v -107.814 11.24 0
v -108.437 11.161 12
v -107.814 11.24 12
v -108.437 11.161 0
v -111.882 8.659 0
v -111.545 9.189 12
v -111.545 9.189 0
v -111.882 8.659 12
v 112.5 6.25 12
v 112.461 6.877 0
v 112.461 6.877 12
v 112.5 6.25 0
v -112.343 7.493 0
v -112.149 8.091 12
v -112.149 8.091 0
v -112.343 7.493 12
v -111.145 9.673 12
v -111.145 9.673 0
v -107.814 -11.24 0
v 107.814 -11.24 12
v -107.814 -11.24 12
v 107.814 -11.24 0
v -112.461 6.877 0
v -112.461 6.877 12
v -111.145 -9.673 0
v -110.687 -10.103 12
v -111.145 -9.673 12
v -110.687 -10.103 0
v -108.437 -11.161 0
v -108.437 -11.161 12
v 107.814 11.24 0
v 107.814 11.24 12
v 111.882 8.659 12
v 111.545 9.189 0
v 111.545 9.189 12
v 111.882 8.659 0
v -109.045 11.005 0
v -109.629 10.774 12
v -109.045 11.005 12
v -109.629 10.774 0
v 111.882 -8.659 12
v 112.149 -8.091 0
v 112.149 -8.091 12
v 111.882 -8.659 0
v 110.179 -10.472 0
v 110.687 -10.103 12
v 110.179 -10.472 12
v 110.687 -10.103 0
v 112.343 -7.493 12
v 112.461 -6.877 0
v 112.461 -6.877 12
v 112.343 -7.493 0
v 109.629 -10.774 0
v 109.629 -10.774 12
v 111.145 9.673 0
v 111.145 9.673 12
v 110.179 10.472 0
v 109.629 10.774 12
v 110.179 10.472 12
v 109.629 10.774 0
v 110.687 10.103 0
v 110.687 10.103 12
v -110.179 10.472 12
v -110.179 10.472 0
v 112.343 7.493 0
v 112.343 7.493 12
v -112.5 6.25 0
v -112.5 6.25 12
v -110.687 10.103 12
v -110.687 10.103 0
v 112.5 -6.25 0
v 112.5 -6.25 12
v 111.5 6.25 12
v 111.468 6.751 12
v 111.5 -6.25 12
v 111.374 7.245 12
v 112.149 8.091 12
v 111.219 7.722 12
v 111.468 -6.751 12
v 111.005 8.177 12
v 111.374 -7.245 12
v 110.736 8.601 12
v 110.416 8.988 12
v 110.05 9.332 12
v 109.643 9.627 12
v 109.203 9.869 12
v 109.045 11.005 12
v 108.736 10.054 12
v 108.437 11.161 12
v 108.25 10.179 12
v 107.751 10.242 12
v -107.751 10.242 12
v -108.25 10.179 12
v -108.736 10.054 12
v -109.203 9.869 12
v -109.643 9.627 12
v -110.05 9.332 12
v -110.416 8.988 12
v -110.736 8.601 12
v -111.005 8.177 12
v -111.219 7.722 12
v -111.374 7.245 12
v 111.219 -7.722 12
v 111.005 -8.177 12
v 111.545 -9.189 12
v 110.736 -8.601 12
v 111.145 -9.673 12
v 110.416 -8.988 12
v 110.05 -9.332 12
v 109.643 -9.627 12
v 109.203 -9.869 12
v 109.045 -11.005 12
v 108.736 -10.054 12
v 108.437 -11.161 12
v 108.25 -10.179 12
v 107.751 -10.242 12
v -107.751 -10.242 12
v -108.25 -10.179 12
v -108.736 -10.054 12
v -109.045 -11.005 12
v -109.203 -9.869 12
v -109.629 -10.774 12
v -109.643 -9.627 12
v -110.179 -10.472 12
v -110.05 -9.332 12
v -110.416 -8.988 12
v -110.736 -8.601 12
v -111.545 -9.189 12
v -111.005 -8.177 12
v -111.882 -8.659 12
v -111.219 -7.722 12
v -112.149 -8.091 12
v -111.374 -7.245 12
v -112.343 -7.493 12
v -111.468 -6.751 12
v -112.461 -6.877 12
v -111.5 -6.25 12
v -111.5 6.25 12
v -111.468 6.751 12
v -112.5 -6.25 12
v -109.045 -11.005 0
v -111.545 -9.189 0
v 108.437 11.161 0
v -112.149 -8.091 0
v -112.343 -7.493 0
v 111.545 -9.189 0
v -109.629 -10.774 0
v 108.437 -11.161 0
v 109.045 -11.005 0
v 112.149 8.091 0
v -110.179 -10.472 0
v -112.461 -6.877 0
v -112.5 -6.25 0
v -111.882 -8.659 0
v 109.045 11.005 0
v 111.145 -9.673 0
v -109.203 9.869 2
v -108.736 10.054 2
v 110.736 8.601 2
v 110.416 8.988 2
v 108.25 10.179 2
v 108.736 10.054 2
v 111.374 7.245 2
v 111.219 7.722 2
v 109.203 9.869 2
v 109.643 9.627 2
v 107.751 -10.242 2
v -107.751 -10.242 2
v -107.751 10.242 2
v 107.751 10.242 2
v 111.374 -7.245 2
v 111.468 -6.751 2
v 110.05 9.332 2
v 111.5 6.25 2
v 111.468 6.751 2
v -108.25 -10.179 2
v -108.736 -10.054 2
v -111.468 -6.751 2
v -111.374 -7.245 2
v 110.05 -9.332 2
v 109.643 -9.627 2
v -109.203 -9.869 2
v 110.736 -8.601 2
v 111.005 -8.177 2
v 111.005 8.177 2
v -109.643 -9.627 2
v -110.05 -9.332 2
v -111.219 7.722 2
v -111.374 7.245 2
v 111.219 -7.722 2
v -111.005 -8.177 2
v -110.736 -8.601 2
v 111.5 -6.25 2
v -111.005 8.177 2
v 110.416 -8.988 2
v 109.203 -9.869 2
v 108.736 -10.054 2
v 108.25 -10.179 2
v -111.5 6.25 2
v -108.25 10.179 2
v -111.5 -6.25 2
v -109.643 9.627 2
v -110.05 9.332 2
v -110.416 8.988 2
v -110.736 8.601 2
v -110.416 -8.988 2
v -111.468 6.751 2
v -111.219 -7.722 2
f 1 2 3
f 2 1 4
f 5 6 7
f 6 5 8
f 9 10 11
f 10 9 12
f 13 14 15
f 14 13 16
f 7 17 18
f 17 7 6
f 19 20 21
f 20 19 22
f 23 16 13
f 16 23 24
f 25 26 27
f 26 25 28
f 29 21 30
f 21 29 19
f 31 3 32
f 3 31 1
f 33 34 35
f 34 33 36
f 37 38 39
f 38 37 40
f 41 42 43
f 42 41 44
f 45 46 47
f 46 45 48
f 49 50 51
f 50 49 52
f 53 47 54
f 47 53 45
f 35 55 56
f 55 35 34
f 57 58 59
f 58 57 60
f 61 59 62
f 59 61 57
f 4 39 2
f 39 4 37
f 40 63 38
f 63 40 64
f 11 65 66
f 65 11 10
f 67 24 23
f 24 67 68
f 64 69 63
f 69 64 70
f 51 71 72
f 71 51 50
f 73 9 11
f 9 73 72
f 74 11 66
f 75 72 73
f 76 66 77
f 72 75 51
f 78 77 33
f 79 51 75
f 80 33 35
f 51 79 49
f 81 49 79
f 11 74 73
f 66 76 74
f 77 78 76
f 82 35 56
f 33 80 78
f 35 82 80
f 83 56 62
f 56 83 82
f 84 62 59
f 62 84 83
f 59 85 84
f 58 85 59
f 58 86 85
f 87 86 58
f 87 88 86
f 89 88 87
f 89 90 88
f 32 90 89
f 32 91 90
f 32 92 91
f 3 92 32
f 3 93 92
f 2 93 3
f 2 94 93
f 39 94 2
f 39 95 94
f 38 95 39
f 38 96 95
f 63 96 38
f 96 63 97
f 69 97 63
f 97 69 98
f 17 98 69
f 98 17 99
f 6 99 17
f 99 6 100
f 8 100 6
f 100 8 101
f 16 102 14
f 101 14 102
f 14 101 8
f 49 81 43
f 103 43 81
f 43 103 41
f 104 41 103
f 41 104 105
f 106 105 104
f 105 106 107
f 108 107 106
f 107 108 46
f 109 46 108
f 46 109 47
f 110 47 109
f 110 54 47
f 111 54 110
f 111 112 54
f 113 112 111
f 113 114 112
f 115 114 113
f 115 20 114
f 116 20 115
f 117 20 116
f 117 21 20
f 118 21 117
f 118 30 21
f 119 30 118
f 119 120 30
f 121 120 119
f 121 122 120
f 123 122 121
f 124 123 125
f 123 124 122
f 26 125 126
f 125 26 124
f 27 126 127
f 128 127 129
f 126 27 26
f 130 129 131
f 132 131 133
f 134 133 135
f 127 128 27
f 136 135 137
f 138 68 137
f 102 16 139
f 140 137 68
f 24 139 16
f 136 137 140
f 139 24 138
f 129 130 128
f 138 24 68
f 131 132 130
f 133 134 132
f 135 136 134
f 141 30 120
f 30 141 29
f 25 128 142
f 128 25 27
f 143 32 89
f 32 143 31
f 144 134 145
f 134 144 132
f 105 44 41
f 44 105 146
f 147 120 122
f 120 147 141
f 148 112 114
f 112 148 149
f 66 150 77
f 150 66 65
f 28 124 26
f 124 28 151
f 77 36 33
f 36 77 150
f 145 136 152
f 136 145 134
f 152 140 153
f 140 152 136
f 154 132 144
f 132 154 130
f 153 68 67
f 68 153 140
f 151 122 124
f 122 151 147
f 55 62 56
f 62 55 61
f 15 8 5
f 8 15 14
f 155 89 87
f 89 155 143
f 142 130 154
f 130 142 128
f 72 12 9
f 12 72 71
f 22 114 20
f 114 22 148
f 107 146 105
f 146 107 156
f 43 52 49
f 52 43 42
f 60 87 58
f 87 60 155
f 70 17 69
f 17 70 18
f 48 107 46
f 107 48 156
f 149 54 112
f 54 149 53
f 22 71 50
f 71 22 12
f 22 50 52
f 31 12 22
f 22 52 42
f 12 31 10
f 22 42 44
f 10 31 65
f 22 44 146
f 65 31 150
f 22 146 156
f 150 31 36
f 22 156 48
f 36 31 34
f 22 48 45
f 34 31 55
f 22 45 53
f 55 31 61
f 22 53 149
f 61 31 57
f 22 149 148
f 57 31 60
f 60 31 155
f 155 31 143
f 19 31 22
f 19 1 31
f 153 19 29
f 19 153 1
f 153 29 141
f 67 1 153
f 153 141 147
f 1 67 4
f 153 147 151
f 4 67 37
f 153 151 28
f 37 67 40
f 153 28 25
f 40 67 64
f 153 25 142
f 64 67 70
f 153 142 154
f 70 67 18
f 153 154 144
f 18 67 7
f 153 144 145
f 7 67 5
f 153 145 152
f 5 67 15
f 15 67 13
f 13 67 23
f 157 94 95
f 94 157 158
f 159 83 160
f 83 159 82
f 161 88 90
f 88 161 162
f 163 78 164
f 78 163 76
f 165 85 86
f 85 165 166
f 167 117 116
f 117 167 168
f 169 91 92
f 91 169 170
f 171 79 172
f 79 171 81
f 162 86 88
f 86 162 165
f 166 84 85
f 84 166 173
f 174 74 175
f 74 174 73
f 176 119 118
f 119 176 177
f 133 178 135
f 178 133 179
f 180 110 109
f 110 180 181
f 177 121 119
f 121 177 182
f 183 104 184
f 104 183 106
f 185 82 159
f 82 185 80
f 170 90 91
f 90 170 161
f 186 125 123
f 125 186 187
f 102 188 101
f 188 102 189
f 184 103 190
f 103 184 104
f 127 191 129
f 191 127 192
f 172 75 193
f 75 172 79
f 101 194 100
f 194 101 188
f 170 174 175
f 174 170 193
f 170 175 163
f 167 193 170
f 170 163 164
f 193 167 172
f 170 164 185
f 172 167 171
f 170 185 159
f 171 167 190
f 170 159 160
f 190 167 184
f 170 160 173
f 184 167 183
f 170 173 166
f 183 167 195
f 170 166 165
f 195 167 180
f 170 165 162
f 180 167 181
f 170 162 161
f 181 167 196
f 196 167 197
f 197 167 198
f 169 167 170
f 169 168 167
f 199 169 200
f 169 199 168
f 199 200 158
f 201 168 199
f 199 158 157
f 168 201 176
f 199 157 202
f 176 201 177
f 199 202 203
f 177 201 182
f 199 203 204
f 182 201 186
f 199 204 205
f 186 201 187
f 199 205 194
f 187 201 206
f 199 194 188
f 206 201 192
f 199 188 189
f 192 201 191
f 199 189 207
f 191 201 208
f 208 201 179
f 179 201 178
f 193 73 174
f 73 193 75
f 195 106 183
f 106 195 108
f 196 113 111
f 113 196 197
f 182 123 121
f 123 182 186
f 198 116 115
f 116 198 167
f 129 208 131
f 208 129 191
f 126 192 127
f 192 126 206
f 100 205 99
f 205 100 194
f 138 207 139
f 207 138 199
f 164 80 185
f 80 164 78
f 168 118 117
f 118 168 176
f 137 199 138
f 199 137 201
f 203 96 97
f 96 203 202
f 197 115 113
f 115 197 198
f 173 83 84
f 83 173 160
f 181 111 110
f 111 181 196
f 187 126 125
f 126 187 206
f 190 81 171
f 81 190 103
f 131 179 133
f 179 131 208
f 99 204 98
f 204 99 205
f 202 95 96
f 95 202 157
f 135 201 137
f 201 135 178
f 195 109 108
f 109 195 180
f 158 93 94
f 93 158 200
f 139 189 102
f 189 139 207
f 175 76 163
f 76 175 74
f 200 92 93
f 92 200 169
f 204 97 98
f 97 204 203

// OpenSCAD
$fn = 50;


difference() {
	union() {
		hull() {
			translate(v = [-107.5000000000, 6.2500000000, 0]) {
				cylinder(h = 12, r = 5);
			}
			translate(v = [107.5000000000, 6.2500000000, 0]) {
				cylinder(h = 12, r = 5);
			}
			translate(v = [-107.5000000000, -6.2500000000, 0]) {
				cylinder(h = 12, r = 5);
			}
			translate(v = [107.5000000000, -6.2500000000, 0]) {
				cylinder(h = 12, r = 5);
			}
		}
	}
	union() {
		translate(v = [0, 0, 2]) {
			hull() {
				translate(v = [-107.5000000000, 6.2500000000, 0]) {
					cylinder(h = 10, r = 4);
				}
				translate(v = [107.5000000000, 6.2500000000, 0]) {
					cylinder(h = 10, r = 4);
				}
				translate(v = [-107.5000000000, -6.2500000000, 0]) {
					cylinder(h = 10, r = 4);
				}
				translate(v = [107.5000000000, -6.2500000000, 0]) {
					cylinder(h = 10, r = 4);
				}
			}
		}
	}
}
